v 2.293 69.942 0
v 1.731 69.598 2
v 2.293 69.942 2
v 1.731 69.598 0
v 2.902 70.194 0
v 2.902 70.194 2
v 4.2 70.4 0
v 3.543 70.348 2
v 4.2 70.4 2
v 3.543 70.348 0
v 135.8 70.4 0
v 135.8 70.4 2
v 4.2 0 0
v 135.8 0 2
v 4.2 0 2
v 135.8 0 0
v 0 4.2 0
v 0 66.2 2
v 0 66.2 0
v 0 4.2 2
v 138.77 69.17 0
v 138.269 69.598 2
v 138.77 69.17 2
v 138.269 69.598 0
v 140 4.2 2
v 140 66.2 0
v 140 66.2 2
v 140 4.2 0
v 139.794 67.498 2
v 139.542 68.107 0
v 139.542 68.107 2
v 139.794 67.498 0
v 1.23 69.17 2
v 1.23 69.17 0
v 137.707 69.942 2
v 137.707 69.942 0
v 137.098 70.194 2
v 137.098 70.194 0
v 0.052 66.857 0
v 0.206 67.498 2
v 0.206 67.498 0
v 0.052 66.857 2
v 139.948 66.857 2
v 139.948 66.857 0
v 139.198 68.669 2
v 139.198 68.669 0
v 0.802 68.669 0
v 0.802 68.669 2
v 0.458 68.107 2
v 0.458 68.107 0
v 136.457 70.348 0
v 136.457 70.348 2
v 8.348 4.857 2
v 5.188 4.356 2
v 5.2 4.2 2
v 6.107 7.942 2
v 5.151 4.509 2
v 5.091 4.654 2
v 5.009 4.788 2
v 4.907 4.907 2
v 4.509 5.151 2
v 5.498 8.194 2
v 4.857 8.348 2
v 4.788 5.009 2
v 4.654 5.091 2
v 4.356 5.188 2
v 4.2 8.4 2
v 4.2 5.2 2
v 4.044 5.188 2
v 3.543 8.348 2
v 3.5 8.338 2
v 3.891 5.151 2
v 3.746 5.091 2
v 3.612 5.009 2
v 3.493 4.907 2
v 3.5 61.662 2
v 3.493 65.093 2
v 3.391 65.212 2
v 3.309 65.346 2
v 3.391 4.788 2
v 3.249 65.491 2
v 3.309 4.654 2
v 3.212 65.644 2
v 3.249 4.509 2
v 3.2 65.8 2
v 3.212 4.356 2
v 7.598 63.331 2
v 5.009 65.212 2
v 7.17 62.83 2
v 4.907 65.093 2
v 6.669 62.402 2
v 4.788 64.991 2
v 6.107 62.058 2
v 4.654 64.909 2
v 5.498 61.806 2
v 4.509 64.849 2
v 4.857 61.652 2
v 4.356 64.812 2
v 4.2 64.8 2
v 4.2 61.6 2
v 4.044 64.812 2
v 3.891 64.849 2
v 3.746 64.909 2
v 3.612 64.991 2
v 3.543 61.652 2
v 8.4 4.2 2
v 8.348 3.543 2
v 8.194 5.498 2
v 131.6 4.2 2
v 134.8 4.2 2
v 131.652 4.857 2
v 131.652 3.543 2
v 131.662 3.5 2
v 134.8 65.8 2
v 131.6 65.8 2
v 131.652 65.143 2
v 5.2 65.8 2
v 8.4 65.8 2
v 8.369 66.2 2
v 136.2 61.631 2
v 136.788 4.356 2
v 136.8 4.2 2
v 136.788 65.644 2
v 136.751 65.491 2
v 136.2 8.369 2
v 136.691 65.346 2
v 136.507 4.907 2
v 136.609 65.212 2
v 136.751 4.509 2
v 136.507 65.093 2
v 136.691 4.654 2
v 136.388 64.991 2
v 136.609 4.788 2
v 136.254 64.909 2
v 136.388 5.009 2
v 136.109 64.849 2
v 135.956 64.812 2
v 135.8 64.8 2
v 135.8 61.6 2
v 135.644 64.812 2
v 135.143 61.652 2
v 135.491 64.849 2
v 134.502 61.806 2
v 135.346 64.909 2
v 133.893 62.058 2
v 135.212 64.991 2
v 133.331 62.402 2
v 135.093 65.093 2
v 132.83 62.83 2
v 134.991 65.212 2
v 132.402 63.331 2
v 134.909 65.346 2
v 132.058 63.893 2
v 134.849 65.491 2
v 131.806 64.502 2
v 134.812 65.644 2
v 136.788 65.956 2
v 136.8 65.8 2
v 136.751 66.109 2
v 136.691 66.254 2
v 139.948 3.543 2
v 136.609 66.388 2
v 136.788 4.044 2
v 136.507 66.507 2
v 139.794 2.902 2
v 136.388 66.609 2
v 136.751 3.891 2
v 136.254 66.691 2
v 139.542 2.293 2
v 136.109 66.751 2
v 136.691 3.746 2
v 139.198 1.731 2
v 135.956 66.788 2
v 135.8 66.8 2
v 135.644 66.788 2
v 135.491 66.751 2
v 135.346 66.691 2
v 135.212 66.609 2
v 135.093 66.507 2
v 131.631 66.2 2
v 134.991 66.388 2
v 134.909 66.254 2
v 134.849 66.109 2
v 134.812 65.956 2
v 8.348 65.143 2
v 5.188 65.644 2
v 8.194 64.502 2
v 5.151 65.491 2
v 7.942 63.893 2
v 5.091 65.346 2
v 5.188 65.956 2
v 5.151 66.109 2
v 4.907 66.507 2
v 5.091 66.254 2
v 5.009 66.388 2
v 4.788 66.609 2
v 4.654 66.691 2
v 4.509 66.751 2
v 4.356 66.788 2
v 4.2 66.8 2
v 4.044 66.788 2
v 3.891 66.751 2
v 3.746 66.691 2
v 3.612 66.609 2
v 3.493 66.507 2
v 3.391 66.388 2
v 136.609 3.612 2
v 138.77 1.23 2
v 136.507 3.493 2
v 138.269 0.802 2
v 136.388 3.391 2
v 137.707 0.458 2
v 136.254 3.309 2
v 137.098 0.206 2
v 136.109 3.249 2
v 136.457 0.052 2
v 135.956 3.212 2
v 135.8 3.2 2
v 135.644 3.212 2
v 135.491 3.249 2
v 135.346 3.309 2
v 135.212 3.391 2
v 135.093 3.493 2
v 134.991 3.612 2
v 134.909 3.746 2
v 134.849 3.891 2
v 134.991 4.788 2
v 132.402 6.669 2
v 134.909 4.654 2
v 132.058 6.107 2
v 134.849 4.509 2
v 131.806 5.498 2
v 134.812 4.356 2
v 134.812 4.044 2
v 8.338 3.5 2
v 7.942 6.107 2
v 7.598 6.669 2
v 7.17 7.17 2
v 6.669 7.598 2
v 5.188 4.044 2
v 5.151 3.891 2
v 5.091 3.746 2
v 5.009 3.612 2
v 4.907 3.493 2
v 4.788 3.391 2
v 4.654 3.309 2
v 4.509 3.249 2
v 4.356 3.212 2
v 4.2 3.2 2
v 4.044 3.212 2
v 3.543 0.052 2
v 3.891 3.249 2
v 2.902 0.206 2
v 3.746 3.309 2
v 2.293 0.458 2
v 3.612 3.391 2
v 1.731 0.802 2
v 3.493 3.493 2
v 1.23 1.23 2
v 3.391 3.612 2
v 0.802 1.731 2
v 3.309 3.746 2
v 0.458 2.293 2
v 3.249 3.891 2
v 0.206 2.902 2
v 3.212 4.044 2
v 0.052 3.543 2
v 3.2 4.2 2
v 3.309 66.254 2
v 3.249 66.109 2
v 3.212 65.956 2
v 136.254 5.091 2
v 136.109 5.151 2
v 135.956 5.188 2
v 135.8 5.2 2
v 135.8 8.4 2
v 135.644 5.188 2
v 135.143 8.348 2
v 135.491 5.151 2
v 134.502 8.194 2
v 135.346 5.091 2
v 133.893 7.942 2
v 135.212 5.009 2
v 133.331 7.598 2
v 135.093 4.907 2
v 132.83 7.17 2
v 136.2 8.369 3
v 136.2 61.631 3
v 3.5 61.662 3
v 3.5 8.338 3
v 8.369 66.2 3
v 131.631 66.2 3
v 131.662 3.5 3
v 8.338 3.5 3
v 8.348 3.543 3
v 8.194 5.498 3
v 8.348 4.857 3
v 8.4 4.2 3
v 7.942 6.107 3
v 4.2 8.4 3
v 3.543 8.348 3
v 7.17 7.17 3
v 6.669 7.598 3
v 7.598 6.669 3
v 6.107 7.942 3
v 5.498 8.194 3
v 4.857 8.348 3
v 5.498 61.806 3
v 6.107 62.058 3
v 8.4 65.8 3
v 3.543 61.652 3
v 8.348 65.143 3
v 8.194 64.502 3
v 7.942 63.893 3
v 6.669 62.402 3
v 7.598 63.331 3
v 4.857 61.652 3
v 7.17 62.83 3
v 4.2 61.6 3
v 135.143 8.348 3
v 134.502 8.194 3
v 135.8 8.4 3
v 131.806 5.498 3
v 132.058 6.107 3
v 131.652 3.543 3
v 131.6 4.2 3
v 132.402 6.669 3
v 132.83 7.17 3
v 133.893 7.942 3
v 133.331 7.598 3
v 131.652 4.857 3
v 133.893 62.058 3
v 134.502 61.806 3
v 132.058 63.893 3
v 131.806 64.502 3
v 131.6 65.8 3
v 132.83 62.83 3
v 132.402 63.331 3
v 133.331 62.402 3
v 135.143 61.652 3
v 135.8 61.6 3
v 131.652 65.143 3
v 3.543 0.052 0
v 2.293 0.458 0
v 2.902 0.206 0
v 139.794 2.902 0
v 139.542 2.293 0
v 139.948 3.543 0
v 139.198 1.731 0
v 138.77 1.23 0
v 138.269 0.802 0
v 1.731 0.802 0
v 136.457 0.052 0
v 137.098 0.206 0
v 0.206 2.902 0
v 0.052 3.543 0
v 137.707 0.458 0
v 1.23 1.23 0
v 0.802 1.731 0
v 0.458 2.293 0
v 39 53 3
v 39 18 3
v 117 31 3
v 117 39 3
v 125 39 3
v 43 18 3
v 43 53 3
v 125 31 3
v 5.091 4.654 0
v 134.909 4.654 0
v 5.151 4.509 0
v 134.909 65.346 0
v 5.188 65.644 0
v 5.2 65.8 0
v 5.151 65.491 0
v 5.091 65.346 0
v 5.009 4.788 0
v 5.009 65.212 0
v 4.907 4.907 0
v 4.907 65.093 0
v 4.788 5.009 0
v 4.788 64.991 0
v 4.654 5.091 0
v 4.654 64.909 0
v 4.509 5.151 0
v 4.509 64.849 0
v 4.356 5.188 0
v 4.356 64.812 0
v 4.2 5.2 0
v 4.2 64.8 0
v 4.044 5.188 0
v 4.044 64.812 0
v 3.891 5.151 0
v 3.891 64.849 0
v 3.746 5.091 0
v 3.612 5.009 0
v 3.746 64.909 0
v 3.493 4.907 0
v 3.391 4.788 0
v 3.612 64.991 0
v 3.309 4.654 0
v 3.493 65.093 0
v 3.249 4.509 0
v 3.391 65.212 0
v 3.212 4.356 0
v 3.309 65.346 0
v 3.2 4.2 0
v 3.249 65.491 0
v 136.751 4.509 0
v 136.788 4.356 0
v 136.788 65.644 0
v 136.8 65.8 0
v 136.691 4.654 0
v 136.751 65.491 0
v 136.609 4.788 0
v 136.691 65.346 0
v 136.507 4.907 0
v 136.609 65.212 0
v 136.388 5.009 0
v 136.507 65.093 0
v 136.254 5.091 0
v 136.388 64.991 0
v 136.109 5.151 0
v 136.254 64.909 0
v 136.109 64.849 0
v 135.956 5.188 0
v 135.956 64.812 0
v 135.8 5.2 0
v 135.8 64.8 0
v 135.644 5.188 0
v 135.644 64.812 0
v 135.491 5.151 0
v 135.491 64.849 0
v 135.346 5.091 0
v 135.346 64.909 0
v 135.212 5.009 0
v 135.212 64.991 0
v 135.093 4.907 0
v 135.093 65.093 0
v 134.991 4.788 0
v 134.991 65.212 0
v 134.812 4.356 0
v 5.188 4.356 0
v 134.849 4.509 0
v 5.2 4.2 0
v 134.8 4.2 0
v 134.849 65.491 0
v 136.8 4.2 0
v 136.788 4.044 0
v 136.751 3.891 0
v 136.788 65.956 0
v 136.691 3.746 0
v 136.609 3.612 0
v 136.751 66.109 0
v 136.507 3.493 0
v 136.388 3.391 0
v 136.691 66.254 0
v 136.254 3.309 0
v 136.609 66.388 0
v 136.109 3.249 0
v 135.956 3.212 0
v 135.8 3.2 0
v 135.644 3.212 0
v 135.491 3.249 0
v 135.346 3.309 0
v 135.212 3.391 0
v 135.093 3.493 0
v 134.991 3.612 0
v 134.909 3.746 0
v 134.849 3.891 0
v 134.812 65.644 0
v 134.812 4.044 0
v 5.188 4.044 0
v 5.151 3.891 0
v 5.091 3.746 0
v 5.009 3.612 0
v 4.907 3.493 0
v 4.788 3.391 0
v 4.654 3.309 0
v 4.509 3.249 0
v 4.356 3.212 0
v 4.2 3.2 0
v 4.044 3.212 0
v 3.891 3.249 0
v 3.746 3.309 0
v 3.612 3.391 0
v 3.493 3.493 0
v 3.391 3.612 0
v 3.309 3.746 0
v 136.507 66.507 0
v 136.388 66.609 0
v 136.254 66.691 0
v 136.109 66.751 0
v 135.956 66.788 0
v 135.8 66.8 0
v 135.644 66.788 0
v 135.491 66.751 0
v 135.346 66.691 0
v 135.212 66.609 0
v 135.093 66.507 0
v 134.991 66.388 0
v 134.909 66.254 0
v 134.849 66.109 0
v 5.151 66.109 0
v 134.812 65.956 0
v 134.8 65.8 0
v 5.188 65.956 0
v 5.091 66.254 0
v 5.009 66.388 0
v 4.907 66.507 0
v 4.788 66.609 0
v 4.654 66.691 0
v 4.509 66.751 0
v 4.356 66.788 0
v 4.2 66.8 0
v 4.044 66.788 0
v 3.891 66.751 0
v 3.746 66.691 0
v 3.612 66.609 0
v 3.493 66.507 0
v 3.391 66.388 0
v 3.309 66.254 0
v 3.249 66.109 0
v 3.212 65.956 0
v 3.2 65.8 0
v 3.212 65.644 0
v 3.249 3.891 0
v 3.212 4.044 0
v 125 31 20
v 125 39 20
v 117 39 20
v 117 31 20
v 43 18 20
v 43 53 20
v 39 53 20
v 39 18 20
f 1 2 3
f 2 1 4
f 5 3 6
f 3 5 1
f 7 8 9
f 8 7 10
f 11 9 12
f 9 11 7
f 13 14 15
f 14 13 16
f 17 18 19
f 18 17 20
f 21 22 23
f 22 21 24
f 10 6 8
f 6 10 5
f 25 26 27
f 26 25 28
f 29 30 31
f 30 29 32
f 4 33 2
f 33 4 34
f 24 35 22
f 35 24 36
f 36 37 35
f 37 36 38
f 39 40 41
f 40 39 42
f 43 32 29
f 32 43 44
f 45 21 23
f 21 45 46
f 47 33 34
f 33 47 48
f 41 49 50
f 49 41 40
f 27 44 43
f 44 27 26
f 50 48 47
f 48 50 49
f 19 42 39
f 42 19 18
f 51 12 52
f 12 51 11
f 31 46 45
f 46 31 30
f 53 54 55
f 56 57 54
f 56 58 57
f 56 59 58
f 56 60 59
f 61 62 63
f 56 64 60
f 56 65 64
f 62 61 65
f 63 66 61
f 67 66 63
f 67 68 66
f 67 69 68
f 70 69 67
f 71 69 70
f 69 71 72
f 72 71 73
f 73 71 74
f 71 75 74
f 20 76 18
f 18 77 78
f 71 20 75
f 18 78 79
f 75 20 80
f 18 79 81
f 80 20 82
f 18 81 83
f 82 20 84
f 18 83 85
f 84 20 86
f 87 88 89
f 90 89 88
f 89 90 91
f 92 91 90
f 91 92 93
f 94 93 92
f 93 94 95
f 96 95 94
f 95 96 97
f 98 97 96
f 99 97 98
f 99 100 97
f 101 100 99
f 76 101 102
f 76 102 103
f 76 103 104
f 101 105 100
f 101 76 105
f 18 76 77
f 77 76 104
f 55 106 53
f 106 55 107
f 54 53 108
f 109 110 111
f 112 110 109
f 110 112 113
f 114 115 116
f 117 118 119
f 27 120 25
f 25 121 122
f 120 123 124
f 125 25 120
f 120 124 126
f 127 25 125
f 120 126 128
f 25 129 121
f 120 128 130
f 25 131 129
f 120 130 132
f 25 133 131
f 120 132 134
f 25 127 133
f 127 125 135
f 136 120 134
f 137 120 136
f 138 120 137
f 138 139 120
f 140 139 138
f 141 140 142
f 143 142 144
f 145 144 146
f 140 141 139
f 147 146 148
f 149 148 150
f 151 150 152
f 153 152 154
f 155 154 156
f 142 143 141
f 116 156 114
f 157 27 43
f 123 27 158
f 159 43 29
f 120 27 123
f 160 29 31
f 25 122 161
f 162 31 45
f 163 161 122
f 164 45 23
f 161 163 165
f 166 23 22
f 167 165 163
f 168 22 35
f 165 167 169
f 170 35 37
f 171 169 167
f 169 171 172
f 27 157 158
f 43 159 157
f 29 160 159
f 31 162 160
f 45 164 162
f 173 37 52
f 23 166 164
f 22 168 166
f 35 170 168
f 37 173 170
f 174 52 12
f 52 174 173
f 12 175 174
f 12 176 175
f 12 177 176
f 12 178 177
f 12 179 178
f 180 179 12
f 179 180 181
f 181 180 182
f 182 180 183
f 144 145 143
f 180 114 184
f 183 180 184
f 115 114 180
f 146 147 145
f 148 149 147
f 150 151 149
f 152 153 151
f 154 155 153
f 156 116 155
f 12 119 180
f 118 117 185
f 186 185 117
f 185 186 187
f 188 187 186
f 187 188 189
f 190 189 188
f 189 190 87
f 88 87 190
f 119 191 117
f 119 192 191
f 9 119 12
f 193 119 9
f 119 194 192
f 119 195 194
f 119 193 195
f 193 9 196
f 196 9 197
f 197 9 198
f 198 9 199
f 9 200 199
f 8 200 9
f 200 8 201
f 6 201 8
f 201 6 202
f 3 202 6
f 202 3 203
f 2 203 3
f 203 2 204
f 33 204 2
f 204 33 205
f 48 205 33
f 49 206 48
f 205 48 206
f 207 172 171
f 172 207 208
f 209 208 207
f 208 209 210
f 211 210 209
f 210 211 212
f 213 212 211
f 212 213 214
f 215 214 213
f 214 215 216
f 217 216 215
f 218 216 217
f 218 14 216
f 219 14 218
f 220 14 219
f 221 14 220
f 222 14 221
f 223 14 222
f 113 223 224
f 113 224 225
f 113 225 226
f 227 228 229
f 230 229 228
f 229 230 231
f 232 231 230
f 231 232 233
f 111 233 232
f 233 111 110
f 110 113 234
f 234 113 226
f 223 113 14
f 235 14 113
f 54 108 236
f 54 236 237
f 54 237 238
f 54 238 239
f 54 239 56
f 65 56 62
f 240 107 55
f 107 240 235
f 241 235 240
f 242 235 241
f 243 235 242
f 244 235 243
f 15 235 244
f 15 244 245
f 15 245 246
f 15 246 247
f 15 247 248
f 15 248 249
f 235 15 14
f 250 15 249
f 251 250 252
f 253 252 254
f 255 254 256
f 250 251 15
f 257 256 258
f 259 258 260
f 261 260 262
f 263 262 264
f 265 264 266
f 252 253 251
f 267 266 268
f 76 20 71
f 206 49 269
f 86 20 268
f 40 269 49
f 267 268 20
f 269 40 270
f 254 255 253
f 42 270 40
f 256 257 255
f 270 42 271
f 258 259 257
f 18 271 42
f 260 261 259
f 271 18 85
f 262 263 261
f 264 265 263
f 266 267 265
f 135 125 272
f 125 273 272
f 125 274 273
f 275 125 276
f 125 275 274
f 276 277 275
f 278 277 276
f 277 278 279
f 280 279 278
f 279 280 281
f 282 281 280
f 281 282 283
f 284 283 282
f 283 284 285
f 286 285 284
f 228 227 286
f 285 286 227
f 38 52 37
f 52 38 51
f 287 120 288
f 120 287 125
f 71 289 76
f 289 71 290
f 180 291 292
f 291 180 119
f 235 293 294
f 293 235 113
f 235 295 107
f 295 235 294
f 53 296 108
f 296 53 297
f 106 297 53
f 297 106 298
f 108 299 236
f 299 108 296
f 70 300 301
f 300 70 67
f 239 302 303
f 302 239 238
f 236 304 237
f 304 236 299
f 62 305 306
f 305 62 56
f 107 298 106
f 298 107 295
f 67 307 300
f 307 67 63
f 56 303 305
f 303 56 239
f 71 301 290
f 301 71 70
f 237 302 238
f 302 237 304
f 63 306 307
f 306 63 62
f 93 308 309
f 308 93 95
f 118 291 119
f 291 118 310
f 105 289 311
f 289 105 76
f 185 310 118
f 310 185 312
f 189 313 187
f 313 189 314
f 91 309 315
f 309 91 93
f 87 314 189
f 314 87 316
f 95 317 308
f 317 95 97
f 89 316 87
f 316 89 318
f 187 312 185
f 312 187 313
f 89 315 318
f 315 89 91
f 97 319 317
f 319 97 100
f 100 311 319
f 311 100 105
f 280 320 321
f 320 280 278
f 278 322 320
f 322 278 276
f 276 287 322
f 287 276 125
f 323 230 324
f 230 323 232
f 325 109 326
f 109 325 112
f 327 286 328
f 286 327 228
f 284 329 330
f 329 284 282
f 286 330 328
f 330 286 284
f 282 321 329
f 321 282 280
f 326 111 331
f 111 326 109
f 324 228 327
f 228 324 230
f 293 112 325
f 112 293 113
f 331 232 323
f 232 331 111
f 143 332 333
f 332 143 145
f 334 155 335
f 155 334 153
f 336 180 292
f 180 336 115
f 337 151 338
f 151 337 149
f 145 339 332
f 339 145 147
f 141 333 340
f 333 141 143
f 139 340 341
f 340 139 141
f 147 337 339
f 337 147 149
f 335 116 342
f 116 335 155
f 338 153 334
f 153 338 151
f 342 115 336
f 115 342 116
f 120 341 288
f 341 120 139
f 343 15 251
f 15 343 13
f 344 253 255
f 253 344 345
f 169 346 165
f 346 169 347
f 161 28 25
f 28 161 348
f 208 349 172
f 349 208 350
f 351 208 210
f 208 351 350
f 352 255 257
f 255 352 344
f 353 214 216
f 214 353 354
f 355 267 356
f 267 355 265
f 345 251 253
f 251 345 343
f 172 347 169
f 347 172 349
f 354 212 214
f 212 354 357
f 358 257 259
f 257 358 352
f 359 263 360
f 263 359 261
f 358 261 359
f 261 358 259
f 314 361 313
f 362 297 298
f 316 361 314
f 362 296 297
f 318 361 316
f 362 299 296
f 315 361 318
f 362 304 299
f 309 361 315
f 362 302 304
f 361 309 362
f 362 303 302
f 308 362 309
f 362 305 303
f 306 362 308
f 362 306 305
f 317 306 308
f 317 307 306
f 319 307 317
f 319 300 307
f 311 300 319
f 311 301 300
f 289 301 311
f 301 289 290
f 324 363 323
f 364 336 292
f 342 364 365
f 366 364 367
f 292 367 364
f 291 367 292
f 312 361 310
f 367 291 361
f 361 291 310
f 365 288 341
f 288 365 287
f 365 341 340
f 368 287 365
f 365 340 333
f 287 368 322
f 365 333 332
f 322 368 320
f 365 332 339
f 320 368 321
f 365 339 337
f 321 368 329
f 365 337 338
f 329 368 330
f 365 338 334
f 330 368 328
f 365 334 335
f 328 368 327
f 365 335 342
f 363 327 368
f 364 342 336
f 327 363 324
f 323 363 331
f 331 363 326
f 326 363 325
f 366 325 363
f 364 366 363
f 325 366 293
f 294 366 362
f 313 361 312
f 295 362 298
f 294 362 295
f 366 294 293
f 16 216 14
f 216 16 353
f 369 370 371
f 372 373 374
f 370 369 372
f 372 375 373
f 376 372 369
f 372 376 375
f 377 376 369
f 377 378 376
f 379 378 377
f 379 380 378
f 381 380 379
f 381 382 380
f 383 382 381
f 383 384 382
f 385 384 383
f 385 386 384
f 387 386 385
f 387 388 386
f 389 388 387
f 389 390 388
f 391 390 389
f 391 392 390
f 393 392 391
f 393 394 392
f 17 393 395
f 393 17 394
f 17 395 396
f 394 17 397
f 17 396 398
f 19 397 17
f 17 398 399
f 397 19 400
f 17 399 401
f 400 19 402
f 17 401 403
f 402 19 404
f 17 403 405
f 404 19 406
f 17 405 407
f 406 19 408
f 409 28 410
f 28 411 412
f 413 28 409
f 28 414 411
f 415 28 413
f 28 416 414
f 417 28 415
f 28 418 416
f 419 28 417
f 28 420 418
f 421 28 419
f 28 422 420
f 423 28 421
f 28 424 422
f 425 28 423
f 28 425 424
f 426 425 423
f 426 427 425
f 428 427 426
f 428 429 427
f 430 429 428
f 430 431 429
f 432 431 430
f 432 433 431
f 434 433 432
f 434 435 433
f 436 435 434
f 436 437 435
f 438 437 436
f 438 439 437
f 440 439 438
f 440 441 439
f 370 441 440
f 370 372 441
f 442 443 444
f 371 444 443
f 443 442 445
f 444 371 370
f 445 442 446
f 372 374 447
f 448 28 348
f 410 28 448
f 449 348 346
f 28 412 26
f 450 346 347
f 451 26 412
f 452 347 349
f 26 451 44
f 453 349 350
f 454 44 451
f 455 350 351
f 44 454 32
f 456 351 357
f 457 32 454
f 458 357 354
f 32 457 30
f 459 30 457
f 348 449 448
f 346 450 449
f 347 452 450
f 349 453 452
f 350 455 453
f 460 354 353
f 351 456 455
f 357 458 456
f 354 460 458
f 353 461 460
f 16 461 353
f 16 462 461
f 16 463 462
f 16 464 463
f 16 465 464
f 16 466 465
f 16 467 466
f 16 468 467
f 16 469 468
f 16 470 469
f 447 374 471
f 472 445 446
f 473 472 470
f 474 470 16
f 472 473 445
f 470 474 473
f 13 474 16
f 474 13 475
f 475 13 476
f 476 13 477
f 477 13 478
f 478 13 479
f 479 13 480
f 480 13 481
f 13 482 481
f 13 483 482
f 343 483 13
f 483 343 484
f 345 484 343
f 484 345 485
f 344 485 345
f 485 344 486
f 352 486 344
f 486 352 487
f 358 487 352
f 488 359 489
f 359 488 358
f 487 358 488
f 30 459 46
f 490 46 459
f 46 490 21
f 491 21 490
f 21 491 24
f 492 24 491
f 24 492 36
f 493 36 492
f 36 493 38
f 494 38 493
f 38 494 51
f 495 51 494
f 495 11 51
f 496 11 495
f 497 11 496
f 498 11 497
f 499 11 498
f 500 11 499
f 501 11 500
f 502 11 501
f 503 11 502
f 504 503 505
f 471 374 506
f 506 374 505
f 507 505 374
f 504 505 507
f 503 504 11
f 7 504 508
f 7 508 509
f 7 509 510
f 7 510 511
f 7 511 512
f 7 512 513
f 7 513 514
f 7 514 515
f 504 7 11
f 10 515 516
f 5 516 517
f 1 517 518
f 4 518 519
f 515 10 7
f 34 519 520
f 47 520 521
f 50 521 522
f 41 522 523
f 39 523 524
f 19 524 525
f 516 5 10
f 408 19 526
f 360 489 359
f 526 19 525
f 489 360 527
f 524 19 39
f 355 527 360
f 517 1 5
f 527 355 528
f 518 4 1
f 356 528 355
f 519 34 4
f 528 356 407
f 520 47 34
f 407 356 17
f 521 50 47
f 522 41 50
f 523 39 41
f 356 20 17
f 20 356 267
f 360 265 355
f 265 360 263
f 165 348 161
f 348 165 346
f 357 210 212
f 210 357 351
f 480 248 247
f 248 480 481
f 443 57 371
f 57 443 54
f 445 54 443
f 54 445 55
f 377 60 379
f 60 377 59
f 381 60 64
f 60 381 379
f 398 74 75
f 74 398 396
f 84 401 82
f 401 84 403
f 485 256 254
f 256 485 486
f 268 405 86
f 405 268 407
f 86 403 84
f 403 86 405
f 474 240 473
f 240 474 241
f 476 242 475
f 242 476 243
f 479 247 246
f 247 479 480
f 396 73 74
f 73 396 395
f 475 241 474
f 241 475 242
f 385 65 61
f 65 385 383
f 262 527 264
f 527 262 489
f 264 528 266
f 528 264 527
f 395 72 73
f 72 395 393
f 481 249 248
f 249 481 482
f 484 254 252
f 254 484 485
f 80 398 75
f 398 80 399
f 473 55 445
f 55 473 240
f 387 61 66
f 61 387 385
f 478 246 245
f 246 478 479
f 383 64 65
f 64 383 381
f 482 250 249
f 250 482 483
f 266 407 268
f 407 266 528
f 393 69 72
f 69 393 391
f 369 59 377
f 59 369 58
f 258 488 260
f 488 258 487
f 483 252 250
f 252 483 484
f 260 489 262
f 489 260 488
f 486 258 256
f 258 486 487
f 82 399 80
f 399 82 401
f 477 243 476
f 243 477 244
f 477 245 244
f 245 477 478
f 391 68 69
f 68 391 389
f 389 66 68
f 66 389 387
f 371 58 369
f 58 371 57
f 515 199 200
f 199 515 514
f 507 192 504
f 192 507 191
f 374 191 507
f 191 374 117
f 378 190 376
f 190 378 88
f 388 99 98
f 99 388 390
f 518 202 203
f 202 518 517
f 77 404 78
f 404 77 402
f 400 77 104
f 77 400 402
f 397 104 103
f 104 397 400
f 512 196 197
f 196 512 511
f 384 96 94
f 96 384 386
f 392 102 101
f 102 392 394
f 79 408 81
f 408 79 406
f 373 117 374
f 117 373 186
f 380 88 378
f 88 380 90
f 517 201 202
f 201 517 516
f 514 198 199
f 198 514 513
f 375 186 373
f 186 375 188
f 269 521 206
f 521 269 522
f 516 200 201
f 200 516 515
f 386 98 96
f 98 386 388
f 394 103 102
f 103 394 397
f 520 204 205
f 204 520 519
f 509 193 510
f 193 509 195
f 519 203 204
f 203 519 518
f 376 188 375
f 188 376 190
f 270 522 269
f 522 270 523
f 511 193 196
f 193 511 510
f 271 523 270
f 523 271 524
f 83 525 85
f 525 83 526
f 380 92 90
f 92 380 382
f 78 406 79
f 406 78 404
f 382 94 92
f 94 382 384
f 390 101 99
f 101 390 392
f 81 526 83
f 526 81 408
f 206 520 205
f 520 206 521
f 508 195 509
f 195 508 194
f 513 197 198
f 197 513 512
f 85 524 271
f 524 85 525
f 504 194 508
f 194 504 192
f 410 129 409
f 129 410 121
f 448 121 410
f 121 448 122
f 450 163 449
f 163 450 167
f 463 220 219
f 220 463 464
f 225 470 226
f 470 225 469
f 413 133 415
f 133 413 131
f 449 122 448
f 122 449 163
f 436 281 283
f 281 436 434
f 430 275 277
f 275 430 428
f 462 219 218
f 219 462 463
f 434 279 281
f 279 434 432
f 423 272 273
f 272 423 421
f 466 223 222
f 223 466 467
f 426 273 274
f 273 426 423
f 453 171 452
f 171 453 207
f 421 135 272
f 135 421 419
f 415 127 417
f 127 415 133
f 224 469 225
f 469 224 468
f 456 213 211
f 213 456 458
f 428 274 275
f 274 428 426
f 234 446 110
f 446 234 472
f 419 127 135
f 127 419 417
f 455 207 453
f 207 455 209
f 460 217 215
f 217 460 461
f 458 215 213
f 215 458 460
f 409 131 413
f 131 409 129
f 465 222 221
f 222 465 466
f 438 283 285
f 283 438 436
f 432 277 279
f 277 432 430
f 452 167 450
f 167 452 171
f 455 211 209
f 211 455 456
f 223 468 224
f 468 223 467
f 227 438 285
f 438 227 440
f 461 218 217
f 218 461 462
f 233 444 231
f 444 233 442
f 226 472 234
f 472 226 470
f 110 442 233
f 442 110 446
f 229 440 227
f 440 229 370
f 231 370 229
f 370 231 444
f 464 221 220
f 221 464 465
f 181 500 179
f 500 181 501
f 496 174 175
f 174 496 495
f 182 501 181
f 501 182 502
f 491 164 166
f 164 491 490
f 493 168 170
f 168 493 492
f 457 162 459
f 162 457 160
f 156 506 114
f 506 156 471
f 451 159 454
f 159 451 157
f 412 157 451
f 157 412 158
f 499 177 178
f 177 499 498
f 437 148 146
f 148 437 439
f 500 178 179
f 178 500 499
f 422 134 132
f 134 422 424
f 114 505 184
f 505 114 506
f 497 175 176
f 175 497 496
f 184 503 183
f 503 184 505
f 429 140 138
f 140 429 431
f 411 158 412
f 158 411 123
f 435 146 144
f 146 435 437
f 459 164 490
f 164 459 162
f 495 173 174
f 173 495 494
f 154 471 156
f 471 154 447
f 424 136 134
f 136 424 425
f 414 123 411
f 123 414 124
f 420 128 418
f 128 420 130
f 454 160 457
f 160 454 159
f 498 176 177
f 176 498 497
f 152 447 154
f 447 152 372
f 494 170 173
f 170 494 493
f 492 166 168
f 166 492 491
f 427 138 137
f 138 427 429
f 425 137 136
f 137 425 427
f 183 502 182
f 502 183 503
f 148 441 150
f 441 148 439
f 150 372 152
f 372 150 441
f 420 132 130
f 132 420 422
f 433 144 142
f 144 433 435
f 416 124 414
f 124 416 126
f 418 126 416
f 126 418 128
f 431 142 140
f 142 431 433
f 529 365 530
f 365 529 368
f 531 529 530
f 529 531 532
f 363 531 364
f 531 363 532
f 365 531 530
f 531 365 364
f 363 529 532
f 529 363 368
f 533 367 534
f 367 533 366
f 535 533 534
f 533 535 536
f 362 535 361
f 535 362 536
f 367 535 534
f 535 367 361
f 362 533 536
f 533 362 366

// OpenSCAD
// C. Strang		
// cstrang@????
// funfor.us

t = 3.5;   	// wall thickness
bt = 3.0;		// base thickness

l = 140	;		// case length
w = 70	;		// case width
ch = 2.9	;	// case height

wl	= 98	;		// window length
ww = 41	;		// window width
cr = 4.2	;		// corner rounding



$fn=40;
difference()
{
	translate([cr,cr,0]) minkowski()
	{
		cube([l-(cr*2),w-8,ch]);
		cylinder(r=cr,h=.1);
	}

	translate([0,0,2]) caseoutline();

	translate([cr,cr,-0.1]) cylinder(r=1,h=3);
	translate([cr,w-cr,-0.1]) cylinder(r=1,h=3);
	translate([l-cr,cr,-0.1]) cylinder(r=1,h=3);
	translate([l-cr,w-cr,-0.1]) cylinder(r=1,h=3);
}

#translate([117,31,2.9]) cube([8,8,17.1]);
#translate([39,18,2.9]) cube([4,35,17.1]);


module caseoutline()
{
	difference()
	{
		translate([cr,cr,0]) minkowski()
		{
			cube([l-(cr*2),w-8,2.9]);
			cylinder(r=cr,h=.1);
		}
		translate([t,t,-0.1]) cube([l-(t*2)-.3,w-(t*2)-.3,3.5]);

	}

	translate([cr,cr,0]) cylinder(r=cr,h=3);
	translate([cr,w-cr,0]) cylinder(r=cr,h=3);
	translate([l-cr,cr,0]) cylinder(r=cr,h=3);
	translate([l-cr,w-cr,0]) cylinder(r=cr,h=3);

}
